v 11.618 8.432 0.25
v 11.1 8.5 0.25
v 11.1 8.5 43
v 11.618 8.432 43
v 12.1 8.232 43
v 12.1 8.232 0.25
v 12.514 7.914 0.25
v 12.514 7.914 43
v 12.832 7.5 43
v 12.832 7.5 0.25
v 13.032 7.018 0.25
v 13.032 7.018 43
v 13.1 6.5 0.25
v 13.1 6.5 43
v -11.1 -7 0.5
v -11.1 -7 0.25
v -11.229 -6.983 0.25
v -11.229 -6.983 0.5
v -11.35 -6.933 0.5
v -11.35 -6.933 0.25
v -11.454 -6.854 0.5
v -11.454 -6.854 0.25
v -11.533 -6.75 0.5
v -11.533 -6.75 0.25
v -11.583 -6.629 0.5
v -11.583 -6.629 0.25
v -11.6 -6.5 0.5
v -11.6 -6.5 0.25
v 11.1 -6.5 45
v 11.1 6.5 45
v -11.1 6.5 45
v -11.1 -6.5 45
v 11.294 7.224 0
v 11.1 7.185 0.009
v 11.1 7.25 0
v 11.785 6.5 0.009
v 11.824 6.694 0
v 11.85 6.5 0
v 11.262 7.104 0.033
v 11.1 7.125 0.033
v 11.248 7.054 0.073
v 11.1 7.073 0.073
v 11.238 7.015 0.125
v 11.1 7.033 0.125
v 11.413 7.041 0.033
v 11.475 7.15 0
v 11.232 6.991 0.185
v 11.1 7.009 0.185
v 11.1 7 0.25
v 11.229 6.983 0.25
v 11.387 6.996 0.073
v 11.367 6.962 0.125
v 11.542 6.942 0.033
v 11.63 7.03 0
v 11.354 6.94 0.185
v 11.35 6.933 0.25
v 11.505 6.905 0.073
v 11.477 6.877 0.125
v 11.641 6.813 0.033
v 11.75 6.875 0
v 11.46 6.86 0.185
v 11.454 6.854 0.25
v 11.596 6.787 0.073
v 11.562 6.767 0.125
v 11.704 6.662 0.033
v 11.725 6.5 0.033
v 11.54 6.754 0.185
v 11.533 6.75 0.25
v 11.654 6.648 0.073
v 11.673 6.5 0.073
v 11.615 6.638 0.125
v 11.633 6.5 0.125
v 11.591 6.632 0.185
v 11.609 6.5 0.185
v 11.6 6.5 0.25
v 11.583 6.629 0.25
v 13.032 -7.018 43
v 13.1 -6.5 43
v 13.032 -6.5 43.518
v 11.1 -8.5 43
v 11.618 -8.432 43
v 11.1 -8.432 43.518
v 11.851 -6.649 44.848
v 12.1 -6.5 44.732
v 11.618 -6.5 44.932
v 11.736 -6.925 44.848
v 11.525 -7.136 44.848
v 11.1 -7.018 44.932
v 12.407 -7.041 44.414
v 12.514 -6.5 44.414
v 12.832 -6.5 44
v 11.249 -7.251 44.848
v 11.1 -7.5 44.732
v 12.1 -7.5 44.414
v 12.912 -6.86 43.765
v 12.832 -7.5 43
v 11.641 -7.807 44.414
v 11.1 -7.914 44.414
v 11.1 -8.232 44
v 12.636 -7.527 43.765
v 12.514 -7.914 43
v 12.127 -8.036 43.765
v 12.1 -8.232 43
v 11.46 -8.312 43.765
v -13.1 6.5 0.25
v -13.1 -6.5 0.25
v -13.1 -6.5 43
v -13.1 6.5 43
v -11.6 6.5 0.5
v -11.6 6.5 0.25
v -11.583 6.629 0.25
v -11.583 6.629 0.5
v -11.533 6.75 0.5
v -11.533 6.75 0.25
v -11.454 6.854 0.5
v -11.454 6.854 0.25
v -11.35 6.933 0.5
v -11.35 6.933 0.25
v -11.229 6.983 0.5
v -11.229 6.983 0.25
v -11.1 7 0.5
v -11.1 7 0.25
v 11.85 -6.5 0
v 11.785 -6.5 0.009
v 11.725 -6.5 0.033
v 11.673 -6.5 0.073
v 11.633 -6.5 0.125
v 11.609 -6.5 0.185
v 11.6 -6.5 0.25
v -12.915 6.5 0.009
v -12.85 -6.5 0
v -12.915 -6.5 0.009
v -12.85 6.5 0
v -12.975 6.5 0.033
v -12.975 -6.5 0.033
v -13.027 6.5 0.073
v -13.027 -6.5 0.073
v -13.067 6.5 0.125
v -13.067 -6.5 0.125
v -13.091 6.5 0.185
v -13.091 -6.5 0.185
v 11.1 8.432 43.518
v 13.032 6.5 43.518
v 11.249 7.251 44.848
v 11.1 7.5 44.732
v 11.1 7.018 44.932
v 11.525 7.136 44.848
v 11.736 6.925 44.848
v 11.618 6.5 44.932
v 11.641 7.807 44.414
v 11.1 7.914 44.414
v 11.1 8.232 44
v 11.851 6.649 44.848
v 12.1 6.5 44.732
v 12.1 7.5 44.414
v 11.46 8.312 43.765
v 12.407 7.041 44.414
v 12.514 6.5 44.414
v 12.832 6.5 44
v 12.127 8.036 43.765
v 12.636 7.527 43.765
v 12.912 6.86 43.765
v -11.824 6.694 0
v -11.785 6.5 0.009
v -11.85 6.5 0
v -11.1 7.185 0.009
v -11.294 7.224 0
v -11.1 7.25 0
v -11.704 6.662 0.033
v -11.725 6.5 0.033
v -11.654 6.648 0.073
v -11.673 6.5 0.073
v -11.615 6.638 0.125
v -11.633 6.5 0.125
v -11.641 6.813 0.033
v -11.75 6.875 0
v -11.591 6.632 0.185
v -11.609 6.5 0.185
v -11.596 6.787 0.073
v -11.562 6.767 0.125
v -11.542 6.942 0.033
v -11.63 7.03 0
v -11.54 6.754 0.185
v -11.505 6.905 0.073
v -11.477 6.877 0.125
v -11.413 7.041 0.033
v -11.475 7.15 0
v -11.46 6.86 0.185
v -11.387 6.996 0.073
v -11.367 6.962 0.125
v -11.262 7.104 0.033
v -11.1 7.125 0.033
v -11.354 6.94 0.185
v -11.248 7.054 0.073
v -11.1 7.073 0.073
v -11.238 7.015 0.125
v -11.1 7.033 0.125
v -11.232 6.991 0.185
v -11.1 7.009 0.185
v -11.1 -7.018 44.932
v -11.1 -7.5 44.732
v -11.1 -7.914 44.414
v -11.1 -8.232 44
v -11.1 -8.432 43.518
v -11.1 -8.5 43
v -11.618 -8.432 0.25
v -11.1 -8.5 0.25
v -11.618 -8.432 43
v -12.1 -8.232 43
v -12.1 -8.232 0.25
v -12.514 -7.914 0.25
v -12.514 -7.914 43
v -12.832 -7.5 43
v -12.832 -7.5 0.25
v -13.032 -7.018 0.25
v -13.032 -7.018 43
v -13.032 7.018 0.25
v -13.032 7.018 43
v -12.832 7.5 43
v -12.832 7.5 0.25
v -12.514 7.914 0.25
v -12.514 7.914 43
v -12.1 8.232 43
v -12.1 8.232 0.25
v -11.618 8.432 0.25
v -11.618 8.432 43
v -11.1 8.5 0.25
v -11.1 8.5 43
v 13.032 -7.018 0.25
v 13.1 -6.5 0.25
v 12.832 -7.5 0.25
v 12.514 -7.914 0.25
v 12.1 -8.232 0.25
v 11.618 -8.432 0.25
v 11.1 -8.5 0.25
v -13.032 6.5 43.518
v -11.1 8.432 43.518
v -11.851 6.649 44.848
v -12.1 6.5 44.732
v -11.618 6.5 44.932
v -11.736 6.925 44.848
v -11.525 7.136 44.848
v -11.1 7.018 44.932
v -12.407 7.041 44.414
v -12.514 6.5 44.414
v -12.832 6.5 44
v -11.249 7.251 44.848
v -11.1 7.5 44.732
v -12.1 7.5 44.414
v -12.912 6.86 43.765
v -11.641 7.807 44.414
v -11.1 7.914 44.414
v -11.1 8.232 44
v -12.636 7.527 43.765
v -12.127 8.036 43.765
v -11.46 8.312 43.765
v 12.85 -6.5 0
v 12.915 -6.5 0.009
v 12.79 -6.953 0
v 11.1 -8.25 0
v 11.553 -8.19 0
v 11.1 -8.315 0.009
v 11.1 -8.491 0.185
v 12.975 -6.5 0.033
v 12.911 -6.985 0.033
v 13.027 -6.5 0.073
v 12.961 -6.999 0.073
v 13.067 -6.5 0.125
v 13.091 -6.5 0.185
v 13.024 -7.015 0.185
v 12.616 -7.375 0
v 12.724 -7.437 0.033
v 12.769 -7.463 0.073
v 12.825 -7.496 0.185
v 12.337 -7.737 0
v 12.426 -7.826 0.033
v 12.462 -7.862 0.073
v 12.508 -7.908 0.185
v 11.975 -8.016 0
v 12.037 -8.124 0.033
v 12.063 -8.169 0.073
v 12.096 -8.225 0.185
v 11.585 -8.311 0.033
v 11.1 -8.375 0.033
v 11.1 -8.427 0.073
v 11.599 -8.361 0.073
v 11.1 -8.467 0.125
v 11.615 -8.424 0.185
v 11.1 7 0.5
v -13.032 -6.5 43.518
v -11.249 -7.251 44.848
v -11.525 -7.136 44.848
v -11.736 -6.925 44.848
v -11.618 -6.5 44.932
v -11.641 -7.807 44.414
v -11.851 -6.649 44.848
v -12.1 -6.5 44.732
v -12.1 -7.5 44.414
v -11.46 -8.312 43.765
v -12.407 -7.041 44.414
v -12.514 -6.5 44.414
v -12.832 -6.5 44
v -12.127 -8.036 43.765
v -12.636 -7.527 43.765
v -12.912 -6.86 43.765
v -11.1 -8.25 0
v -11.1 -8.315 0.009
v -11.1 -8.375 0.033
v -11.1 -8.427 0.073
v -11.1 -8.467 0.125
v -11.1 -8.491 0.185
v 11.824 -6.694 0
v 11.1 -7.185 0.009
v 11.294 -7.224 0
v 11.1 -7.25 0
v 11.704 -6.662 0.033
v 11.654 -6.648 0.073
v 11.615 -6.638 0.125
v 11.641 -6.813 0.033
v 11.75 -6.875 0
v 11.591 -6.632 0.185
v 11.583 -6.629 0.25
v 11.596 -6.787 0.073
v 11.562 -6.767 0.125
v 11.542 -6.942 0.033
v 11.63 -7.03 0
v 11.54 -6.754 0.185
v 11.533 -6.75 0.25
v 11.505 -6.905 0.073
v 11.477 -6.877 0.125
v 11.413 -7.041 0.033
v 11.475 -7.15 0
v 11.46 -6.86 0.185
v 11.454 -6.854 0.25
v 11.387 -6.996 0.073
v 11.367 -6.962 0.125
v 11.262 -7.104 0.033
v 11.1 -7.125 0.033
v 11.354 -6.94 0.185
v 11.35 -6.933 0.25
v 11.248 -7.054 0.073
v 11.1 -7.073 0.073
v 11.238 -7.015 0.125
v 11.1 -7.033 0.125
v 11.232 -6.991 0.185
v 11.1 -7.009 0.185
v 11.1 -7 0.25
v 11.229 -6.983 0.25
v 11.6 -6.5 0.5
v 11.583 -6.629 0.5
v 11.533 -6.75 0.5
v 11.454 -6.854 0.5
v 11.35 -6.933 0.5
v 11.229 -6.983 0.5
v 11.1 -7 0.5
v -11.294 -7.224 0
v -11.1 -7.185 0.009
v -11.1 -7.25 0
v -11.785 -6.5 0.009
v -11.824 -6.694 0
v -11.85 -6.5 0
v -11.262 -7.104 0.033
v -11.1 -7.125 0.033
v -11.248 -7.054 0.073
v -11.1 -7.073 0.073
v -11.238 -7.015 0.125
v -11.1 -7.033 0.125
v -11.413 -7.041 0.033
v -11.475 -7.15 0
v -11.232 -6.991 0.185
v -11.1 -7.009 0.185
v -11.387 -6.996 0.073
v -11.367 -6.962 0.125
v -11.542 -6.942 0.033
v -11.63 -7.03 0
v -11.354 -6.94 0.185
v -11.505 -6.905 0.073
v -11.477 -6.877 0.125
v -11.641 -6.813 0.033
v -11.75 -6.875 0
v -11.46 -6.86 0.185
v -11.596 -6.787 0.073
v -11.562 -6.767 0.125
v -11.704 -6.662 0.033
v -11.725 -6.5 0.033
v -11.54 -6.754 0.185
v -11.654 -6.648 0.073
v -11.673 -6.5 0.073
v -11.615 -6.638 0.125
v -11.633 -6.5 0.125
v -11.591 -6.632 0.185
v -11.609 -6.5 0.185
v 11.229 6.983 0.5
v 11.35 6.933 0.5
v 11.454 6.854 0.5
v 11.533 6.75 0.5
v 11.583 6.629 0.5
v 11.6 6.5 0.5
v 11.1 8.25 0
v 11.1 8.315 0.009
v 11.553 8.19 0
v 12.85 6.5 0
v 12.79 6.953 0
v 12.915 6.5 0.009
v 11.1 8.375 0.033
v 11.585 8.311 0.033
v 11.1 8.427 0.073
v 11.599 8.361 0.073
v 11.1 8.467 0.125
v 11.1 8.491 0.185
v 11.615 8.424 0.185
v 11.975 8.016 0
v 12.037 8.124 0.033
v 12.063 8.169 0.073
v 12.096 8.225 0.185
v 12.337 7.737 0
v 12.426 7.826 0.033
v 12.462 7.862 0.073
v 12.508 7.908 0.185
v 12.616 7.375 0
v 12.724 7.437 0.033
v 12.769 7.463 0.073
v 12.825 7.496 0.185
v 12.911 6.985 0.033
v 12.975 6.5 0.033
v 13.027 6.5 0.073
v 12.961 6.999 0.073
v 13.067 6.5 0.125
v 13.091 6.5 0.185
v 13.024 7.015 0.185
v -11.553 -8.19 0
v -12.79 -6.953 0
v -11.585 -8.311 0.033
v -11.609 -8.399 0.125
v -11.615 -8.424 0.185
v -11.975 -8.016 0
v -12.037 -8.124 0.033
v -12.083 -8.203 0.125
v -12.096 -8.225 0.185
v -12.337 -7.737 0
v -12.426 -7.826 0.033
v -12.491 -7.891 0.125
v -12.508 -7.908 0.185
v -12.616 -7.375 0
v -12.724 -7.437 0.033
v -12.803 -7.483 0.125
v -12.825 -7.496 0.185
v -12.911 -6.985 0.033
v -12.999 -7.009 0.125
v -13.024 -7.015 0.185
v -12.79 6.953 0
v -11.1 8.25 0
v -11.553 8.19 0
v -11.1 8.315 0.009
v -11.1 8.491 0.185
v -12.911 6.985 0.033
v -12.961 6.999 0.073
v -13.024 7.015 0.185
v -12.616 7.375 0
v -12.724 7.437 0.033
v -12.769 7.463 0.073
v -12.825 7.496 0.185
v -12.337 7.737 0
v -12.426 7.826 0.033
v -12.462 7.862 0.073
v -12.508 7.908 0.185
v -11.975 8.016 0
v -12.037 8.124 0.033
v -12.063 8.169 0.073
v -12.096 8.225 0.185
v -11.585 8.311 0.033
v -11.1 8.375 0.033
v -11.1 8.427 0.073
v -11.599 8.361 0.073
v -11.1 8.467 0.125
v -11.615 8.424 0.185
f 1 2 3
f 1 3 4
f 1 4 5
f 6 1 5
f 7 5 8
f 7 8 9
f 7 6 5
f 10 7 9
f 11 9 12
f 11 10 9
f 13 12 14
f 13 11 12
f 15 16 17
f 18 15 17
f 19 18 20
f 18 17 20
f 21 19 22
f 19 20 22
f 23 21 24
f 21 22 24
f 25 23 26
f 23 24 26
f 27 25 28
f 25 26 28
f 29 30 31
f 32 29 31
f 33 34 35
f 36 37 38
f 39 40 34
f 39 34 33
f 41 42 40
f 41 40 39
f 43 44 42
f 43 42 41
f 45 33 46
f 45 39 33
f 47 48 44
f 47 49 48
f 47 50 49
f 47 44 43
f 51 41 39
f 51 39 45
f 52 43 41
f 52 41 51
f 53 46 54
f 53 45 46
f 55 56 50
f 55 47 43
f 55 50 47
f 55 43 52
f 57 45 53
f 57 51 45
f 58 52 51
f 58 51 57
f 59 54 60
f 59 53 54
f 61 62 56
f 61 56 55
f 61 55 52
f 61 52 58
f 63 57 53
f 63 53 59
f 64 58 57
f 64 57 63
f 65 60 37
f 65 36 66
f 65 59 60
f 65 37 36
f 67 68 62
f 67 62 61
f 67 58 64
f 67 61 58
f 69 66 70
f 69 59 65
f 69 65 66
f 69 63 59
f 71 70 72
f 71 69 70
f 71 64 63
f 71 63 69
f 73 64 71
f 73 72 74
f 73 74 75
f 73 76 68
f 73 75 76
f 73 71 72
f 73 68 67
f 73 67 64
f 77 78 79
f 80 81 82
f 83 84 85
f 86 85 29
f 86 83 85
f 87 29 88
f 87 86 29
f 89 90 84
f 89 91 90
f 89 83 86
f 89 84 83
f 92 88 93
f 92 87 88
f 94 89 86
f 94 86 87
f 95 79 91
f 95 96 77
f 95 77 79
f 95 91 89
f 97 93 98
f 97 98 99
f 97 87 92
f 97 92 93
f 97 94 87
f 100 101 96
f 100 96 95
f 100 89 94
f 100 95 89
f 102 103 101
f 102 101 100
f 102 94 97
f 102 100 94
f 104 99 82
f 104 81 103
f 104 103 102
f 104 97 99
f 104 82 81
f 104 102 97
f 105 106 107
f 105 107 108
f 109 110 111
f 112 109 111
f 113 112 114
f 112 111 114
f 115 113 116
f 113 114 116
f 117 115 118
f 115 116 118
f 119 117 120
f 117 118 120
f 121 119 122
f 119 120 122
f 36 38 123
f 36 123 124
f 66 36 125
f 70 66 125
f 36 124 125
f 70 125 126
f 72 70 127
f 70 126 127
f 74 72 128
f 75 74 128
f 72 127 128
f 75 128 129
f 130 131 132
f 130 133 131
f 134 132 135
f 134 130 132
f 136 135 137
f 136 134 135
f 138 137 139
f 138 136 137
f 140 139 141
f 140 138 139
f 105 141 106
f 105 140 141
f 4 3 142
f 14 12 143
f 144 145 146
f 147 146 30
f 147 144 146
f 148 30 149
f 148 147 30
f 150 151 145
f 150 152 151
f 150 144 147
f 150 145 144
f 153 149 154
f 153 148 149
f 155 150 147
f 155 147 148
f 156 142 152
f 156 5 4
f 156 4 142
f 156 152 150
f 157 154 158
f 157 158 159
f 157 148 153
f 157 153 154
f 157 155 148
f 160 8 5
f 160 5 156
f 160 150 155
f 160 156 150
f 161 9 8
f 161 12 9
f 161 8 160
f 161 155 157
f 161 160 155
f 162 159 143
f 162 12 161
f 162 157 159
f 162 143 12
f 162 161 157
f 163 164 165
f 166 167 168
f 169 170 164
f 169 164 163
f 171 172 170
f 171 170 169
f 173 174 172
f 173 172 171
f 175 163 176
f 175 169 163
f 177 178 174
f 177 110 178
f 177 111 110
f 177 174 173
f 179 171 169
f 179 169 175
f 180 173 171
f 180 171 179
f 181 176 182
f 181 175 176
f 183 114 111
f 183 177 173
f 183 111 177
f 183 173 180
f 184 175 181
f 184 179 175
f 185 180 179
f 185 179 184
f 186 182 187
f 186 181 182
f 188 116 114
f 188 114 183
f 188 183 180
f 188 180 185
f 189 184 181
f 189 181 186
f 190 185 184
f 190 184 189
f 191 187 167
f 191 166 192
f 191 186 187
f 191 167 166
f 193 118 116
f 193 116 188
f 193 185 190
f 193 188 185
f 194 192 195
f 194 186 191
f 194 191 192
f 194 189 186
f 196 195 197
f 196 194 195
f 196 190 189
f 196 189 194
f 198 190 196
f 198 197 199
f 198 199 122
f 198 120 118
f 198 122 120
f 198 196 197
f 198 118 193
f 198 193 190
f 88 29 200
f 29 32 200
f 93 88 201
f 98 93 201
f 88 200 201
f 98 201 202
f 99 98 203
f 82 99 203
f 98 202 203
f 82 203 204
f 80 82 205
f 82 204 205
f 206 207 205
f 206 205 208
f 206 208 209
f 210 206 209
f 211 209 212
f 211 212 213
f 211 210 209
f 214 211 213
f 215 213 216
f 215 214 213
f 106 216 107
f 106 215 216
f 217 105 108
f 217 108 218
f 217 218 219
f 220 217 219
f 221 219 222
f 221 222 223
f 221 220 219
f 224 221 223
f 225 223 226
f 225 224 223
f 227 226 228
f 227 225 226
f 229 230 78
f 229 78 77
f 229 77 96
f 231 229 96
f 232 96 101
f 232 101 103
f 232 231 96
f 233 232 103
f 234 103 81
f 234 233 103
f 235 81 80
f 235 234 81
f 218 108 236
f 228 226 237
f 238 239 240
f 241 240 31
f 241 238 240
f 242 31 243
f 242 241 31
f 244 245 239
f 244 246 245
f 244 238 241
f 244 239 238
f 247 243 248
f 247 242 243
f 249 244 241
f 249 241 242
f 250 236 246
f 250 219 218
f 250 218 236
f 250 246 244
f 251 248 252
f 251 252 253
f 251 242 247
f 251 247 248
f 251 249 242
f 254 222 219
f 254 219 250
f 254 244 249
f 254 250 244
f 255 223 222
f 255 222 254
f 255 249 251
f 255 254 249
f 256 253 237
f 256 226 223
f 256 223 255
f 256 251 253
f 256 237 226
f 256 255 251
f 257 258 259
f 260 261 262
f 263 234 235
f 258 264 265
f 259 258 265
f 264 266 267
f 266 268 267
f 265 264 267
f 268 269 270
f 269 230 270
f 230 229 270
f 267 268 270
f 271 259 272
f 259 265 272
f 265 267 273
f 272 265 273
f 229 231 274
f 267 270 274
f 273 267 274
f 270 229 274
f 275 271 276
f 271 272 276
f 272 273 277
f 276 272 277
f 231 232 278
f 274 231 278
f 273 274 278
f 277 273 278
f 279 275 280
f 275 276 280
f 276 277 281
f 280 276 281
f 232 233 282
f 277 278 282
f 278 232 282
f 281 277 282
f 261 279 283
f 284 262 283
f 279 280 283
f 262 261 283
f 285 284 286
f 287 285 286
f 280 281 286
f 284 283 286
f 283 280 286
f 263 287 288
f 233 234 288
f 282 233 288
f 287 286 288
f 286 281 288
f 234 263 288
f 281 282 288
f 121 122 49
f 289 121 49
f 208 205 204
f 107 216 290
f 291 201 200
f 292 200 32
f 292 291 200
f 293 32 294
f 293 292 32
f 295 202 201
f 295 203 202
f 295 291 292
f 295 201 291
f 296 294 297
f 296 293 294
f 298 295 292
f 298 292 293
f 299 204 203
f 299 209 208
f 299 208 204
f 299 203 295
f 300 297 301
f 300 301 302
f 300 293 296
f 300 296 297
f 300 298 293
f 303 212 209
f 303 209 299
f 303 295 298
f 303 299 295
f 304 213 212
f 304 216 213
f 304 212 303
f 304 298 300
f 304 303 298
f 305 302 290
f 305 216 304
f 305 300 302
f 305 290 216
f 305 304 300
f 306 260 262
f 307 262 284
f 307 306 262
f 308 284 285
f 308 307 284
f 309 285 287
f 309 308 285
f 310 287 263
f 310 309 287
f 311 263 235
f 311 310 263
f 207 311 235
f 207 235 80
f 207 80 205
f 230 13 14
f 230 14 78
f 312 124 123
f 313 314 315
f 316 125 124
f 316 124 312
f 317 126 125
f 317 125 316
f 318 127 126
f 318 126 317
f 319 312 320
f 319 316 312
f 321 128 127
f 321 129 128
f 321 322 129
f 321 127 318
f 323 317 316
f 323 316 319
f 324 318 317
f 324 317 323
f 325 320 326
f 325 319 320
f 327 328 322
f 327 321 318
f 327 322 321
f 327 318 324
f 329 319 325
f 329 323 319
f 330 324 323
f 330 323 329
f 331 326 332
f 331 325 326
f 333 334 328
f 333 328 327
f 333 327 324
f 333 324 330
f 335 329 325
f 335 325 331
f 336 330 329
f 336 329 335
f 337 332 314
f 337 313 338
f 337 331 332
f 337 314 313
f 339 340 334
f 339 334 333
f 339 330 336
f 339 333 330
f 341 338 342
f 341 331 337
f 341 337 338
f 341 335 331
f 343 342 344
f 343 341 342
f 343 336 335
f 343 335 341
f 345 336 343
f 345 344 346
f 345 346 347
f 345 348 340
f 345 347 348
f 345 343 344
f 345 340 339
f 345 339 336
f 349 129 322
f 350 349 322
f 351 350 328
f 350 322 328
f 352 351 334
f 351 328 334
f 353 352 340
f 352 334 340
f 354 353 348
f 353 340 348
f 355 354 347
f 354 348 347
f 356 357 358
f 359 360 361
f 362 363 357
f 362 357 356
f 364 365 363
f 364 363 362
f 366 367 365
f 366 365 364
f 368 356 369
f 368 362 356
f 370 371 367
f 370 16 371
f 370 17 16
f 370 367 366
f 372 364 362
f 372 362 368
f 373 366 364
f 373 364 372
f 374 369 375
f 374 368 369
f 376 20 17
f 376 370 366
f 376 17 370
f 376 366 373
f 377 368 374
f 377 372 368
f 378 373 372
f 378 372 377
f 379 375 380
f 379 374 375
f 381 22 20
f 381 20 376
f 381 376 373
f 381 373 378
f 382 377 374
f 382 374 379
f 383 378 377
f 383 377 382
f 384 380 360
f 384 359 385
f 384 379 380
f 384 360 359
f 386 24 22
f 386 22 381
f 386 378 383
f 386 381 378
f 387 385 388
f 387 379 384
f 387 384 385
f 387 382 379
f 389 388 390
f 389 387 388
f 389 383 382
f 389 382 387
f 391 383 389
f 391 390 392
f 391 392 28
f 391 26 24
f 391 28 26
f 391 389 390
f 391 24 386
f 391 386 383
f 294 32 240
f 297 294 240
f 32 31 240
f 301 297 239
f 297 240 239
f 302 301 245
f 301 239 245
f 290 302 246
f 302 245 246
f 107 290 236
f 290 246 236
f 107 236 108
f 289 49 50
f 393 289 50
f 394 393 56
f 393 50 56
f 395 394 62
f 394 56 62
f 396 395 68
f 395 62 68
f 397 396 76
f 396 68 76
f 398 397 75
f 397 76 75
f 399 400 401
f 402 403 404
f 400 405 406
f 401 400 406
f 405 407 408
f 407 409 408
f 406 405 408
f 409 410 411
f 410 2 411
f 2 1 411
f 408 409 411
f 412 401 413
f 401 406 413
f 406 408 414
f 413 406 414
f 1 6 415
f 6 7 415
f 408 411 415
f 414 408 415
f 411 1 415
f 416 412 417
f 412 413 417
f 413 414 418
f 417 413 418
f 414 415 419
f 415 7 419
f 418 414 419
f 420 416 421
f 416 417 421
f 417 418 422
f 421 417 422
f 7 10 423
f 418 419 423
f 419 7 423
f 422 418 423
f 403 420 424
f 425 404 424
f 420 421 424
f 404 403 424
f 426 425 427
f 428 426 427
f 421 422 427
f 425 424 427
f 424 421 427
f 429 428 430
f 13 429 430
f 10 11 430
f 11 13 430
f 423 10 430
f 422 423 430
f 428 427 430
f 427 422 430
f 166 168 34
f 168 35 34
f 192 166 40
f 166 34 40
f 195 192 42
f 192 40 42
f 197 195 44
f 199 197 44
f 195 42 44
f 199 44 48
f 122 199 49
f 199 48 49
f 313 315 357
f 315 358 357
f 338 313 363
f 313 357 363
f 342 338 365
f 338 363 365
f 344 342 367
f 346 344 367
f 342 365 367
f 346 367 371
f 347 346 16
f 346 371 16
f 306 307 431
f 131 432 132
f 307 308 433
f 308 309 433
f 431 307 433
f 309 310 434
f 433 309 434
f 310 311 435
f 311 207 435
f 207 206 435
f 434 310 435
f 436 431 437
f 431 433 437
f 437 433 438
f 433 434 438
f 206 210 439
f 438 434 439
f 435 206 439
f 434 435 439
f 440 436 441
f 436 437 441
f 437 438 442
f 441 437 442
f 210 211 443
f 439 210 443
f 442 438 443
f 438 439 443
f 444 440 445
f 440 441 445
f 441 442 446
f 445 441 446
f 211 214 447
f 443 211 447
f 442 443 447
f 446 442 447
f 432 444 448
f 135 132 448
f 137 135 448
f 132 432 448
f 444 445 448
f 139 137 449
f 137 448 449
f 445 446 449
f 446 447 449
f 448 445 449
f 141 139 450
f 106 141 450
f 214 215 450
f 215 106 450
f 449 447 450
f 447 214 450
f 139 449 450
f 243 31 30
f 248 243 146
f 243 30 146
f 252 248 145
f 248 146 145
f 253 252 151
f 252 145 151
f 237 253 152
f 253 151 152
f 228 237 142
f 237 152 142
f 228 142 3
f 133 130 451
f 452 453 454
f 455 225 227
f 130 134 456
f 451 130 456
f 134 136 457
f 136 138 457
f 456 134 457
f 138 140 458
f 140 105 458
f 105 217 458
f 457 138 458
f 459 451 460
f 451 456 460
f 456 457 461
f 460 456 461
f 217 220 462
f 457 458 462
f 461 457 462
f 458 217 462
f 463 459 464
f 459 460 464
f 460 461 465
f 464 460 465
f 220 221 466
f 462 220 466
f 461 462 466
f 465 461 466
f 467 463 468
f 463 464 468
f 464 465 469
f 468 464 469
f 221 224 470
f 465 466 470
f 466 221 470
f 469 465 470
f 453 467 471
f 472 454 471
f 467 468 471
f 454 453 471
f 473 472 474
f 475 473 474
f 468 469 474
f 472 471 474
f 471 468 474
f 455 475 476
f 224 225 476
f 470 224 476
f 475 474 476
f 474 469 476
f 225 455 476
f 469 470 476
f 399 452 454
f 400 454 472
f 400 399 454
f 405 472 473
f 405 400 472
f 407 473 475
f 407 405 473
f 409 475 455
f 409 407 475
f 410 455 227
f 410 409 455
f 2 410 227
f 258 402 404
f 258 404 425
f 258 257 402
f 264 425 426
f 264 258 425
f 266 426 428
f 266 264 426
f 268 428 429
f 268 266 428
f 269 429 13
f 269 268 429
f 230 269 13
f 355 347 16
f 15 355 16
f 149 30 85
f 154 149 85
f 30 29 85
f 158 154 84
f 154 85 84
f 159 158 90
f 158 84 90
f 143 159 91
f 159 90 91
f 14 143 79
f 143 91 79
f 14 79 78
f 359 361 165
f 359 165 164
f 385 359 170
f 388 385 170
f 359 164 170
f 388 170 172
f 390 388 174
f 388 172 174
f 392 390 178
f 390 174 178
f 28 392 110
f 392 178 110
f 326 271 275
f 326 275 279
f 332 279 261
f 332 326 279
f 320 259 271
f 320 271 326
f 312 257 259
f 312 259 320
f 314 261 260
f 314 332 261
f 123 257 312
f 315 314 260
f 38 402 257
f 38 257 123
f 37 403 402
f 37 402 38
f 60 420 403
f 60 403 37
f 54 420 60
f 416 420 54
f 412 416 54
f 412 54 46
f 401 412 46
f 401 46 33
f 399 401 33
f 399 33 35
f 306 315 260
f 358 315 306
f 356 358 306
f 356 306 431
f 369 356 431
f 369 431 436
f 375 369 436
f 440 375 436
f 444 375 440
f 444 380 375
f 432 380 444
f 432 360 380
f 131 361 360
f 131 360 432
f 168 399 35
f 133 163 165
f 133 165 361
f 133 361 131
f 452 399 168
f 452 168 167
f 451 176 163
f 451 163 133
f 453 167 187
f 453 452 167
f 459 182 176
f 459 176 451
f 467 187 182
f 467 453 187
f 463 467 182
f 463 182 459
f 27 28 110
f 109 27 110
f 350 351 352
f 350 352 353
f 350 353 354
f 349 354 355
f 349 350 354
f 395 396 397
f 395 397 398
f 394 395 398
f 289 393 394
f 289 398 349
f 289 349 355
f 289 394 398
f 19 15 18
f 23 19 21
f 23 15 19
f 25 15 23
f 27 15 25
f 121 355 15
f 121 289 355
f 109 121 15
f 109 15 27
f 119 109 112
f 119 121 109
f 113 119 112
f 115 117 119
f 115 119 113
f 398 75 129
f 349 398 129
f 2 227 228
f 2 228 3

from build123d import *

# Parameters (mm, degrees)
BOSS_EXTRU_1_DEPTH      = 45
ENL_V_MAT_EXTRU_1_DEPTH = 0.5
CONG_1_R                = 0.25
CONG_2_R                = 2


with BuildPart() as part:
    # Esquisse1 → Boss.-Extru.1 (new body)
    with BuildSketch(Plane.XY):
        with BuildLine():
            Line((-11.1, 8.5), (11.1, 8.5))
            ThreePointArc((11.1, 8.5), (12.514213562, 7.914213562), (13.1, 6.5))
            Line((13.1, 6.5), (13.1, -6.5))
            ThreePointArc((13.1, -6.5), (12.514213562, -7.914213562), (11.1, -8.5))
            Line((11.1, -8.5), (-11.1, -8.5))
            ThreePointArc((-11.1, -8.5), (-12.514213562, -7.914213562), (-13.1, -6.5))
            Line((-13.1, -6.5), (-13.1, 6.5))
            ThreePointArc((-13.1, 6.5), (-12.514213562, 7.914213562), (-11.1, 8.5))
        make_face()
    extrude(amount=BOSS_EXTRU_1_DEPTH)

    # Esquisse2 → Enlèv. mat.-Extru.1 (cut)
    with BuildSketch(Plane(origin=(0, 0, 0), x_dir=(-1, 0, 0), z_dir=(0, 0, -1))):
        with BuildLine():
            Line((11.6, -6.5), (11.6, 6.5))
            ThreePointArc((11.6, 6.5), (11.453553391, 6.853553391), (11.1, 7))
            Line((11.1, 7), (-11.1, 7))
            ThreePointArc((-11.1, 7), (-11.453553391, 6.853553391), (-11.6, 6.5))
            Line((-11.6, 6.5), (-11.6, -6.5))
            ThreePointArc((-11.6, -6.5), (-11.453553391, -6.853553391), (-11.1, -7))
            Line((-11.1, -7), (11.1, -7))
            ThreePointArc((11.1, -7), (11.453553391, -6.853553391), (11.6, -6.5))
        make_face()
    extrude(amount=-ENL_V_MAT_EXTRU_1_DEPTH, mode=Mode.SUBTRACT)

    # Congé1
    cong_1_edges = [part.edges().sort_by_distance(p)[0] for p in [
        (-13.1, 0, 0),
        (-12.514213562, 7.914213562, 0),
        (-11.453553391, 6.853553391, 0),
        (0, 7, 0),
        (11.453553391, 6.853553391, 0),
        (11.6, 0, 0),
        (11.453553391, -6.853553391, 0),
        (0, -7, 0),
        (-11.453553391, -6.853553391, 0),
        (-11.6, 0, 0),
        (0, 8.5, 0),
        (12.514213562, 7.914213562, 0),
        (13.1, 0, 0),
        (12.514213562, -7.914213562, 0),
        (0, -8.5, 0),
        (-12.514213562, -7.914213562, 0),
    ]]
    fillet(cong_1_edges, radius=CONG_1_R)

    # Congé2
    cong_2_edges = [part.edges().sort_by_distance(p)[0] for p in [
        (-12.514213562, -7.914213562, 45),
        (0, -8.5, 45),
        (12.514213562, -7.914213562, 45),
        (13.1, 0, 45),
        (12.514213562, 7.914213562, 45),
        (0, 8.5, 45),
        (-12.514213562, 7.914213562, 45),
        (-13.1, 0, 45),
    ]]
    fillet(cong_2_edges, radius=CONG_2_R)


solid = part.part
